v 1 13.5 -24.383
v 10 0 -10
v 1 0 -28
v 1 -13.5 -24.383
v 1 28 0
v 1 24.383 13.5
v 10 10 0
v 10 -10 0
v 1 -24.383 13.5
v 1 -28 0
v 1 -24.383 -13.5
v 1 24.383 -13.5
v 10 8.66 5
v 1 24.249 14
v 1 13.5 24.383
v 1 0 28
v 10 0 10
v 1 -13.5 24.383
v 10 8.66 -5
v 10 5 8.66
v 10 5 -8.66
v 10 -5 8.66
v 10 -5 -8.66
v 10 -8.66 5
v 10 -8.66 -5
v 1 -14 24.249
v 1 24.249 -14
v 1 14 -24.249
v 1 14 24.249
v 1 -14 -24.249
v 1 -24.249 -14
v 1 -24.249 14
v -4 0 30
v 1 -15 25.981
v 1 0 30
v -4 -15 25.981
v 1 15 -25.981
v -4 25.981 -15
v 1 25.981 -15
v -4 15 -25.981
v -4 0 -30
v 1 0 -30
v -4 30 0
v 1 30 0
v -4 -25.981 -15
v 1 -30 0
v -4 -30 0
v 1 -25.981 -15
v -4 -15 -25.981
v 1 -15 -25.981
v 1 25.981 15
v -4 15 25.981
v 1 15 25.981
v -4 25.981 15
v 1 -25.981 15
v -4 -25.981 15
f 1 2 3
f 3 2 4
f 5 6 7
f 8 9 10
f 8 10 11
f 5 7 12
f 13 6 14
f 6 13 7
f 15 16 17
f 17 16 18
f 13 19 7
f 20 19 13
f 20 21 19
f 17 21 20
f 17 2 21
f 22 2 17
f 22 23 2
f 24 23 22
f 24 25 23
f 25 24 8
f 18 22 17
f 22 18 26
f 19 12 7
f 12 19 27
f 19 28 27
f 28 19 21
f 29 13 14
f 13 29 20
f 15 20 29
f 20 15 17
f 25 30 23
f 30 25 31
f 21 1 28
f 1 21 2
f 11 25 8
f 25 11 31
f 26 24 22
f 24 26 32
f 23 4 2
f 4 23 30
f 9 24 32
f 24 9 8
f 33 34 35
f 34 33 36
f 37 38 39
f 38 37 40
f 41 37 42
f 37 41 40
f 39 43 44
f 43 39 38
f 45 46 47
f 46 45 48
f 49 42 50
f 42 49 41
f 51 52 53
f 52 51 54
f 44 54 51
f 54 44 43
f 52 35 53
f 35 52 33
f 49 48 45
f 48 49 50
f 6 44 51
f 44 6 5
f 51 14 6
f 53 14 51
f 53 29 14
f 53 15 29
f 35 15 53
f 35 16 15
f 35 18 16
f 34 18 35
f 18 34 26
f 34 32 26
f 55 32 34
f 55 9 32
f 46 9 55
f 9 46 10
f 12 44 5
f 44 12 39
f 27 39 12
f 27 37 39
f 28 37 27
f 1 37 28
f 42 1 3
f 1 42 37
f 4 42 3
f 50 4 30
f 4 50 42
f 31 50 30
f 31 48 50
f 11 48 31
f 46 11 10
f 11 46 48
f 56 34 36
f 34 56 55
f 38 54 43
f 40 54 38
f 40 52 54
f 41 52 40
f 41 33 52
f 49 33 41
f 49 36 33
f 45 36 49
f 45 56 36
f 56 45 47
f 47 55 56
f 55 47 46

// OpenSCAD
// file: imposter_docking_port.scad
module docking_port(x, y, z, rx, ry, rz, angle, scale) {
	translate([x,y,z]) {
		scale(v = [scale, scale, scale]) {
			rotate(v = [rx, ry, rz], a = angle) {
				rotate(v = [0, 1, 0], a = 90)
					union() {
						cylinder(h = 10, r1 = 30, r2 = 10);
						translate(v = [0, 0, -4])
							cylinder(h = 5, r1 = 30, r2 = 30);
					}
			}
		}
	}
}
// main file
$fn=12;

use <imposter_docking_port.scad>;

docking_port(0, 0, 0, 0, 0, 1, 0, 1.0);
